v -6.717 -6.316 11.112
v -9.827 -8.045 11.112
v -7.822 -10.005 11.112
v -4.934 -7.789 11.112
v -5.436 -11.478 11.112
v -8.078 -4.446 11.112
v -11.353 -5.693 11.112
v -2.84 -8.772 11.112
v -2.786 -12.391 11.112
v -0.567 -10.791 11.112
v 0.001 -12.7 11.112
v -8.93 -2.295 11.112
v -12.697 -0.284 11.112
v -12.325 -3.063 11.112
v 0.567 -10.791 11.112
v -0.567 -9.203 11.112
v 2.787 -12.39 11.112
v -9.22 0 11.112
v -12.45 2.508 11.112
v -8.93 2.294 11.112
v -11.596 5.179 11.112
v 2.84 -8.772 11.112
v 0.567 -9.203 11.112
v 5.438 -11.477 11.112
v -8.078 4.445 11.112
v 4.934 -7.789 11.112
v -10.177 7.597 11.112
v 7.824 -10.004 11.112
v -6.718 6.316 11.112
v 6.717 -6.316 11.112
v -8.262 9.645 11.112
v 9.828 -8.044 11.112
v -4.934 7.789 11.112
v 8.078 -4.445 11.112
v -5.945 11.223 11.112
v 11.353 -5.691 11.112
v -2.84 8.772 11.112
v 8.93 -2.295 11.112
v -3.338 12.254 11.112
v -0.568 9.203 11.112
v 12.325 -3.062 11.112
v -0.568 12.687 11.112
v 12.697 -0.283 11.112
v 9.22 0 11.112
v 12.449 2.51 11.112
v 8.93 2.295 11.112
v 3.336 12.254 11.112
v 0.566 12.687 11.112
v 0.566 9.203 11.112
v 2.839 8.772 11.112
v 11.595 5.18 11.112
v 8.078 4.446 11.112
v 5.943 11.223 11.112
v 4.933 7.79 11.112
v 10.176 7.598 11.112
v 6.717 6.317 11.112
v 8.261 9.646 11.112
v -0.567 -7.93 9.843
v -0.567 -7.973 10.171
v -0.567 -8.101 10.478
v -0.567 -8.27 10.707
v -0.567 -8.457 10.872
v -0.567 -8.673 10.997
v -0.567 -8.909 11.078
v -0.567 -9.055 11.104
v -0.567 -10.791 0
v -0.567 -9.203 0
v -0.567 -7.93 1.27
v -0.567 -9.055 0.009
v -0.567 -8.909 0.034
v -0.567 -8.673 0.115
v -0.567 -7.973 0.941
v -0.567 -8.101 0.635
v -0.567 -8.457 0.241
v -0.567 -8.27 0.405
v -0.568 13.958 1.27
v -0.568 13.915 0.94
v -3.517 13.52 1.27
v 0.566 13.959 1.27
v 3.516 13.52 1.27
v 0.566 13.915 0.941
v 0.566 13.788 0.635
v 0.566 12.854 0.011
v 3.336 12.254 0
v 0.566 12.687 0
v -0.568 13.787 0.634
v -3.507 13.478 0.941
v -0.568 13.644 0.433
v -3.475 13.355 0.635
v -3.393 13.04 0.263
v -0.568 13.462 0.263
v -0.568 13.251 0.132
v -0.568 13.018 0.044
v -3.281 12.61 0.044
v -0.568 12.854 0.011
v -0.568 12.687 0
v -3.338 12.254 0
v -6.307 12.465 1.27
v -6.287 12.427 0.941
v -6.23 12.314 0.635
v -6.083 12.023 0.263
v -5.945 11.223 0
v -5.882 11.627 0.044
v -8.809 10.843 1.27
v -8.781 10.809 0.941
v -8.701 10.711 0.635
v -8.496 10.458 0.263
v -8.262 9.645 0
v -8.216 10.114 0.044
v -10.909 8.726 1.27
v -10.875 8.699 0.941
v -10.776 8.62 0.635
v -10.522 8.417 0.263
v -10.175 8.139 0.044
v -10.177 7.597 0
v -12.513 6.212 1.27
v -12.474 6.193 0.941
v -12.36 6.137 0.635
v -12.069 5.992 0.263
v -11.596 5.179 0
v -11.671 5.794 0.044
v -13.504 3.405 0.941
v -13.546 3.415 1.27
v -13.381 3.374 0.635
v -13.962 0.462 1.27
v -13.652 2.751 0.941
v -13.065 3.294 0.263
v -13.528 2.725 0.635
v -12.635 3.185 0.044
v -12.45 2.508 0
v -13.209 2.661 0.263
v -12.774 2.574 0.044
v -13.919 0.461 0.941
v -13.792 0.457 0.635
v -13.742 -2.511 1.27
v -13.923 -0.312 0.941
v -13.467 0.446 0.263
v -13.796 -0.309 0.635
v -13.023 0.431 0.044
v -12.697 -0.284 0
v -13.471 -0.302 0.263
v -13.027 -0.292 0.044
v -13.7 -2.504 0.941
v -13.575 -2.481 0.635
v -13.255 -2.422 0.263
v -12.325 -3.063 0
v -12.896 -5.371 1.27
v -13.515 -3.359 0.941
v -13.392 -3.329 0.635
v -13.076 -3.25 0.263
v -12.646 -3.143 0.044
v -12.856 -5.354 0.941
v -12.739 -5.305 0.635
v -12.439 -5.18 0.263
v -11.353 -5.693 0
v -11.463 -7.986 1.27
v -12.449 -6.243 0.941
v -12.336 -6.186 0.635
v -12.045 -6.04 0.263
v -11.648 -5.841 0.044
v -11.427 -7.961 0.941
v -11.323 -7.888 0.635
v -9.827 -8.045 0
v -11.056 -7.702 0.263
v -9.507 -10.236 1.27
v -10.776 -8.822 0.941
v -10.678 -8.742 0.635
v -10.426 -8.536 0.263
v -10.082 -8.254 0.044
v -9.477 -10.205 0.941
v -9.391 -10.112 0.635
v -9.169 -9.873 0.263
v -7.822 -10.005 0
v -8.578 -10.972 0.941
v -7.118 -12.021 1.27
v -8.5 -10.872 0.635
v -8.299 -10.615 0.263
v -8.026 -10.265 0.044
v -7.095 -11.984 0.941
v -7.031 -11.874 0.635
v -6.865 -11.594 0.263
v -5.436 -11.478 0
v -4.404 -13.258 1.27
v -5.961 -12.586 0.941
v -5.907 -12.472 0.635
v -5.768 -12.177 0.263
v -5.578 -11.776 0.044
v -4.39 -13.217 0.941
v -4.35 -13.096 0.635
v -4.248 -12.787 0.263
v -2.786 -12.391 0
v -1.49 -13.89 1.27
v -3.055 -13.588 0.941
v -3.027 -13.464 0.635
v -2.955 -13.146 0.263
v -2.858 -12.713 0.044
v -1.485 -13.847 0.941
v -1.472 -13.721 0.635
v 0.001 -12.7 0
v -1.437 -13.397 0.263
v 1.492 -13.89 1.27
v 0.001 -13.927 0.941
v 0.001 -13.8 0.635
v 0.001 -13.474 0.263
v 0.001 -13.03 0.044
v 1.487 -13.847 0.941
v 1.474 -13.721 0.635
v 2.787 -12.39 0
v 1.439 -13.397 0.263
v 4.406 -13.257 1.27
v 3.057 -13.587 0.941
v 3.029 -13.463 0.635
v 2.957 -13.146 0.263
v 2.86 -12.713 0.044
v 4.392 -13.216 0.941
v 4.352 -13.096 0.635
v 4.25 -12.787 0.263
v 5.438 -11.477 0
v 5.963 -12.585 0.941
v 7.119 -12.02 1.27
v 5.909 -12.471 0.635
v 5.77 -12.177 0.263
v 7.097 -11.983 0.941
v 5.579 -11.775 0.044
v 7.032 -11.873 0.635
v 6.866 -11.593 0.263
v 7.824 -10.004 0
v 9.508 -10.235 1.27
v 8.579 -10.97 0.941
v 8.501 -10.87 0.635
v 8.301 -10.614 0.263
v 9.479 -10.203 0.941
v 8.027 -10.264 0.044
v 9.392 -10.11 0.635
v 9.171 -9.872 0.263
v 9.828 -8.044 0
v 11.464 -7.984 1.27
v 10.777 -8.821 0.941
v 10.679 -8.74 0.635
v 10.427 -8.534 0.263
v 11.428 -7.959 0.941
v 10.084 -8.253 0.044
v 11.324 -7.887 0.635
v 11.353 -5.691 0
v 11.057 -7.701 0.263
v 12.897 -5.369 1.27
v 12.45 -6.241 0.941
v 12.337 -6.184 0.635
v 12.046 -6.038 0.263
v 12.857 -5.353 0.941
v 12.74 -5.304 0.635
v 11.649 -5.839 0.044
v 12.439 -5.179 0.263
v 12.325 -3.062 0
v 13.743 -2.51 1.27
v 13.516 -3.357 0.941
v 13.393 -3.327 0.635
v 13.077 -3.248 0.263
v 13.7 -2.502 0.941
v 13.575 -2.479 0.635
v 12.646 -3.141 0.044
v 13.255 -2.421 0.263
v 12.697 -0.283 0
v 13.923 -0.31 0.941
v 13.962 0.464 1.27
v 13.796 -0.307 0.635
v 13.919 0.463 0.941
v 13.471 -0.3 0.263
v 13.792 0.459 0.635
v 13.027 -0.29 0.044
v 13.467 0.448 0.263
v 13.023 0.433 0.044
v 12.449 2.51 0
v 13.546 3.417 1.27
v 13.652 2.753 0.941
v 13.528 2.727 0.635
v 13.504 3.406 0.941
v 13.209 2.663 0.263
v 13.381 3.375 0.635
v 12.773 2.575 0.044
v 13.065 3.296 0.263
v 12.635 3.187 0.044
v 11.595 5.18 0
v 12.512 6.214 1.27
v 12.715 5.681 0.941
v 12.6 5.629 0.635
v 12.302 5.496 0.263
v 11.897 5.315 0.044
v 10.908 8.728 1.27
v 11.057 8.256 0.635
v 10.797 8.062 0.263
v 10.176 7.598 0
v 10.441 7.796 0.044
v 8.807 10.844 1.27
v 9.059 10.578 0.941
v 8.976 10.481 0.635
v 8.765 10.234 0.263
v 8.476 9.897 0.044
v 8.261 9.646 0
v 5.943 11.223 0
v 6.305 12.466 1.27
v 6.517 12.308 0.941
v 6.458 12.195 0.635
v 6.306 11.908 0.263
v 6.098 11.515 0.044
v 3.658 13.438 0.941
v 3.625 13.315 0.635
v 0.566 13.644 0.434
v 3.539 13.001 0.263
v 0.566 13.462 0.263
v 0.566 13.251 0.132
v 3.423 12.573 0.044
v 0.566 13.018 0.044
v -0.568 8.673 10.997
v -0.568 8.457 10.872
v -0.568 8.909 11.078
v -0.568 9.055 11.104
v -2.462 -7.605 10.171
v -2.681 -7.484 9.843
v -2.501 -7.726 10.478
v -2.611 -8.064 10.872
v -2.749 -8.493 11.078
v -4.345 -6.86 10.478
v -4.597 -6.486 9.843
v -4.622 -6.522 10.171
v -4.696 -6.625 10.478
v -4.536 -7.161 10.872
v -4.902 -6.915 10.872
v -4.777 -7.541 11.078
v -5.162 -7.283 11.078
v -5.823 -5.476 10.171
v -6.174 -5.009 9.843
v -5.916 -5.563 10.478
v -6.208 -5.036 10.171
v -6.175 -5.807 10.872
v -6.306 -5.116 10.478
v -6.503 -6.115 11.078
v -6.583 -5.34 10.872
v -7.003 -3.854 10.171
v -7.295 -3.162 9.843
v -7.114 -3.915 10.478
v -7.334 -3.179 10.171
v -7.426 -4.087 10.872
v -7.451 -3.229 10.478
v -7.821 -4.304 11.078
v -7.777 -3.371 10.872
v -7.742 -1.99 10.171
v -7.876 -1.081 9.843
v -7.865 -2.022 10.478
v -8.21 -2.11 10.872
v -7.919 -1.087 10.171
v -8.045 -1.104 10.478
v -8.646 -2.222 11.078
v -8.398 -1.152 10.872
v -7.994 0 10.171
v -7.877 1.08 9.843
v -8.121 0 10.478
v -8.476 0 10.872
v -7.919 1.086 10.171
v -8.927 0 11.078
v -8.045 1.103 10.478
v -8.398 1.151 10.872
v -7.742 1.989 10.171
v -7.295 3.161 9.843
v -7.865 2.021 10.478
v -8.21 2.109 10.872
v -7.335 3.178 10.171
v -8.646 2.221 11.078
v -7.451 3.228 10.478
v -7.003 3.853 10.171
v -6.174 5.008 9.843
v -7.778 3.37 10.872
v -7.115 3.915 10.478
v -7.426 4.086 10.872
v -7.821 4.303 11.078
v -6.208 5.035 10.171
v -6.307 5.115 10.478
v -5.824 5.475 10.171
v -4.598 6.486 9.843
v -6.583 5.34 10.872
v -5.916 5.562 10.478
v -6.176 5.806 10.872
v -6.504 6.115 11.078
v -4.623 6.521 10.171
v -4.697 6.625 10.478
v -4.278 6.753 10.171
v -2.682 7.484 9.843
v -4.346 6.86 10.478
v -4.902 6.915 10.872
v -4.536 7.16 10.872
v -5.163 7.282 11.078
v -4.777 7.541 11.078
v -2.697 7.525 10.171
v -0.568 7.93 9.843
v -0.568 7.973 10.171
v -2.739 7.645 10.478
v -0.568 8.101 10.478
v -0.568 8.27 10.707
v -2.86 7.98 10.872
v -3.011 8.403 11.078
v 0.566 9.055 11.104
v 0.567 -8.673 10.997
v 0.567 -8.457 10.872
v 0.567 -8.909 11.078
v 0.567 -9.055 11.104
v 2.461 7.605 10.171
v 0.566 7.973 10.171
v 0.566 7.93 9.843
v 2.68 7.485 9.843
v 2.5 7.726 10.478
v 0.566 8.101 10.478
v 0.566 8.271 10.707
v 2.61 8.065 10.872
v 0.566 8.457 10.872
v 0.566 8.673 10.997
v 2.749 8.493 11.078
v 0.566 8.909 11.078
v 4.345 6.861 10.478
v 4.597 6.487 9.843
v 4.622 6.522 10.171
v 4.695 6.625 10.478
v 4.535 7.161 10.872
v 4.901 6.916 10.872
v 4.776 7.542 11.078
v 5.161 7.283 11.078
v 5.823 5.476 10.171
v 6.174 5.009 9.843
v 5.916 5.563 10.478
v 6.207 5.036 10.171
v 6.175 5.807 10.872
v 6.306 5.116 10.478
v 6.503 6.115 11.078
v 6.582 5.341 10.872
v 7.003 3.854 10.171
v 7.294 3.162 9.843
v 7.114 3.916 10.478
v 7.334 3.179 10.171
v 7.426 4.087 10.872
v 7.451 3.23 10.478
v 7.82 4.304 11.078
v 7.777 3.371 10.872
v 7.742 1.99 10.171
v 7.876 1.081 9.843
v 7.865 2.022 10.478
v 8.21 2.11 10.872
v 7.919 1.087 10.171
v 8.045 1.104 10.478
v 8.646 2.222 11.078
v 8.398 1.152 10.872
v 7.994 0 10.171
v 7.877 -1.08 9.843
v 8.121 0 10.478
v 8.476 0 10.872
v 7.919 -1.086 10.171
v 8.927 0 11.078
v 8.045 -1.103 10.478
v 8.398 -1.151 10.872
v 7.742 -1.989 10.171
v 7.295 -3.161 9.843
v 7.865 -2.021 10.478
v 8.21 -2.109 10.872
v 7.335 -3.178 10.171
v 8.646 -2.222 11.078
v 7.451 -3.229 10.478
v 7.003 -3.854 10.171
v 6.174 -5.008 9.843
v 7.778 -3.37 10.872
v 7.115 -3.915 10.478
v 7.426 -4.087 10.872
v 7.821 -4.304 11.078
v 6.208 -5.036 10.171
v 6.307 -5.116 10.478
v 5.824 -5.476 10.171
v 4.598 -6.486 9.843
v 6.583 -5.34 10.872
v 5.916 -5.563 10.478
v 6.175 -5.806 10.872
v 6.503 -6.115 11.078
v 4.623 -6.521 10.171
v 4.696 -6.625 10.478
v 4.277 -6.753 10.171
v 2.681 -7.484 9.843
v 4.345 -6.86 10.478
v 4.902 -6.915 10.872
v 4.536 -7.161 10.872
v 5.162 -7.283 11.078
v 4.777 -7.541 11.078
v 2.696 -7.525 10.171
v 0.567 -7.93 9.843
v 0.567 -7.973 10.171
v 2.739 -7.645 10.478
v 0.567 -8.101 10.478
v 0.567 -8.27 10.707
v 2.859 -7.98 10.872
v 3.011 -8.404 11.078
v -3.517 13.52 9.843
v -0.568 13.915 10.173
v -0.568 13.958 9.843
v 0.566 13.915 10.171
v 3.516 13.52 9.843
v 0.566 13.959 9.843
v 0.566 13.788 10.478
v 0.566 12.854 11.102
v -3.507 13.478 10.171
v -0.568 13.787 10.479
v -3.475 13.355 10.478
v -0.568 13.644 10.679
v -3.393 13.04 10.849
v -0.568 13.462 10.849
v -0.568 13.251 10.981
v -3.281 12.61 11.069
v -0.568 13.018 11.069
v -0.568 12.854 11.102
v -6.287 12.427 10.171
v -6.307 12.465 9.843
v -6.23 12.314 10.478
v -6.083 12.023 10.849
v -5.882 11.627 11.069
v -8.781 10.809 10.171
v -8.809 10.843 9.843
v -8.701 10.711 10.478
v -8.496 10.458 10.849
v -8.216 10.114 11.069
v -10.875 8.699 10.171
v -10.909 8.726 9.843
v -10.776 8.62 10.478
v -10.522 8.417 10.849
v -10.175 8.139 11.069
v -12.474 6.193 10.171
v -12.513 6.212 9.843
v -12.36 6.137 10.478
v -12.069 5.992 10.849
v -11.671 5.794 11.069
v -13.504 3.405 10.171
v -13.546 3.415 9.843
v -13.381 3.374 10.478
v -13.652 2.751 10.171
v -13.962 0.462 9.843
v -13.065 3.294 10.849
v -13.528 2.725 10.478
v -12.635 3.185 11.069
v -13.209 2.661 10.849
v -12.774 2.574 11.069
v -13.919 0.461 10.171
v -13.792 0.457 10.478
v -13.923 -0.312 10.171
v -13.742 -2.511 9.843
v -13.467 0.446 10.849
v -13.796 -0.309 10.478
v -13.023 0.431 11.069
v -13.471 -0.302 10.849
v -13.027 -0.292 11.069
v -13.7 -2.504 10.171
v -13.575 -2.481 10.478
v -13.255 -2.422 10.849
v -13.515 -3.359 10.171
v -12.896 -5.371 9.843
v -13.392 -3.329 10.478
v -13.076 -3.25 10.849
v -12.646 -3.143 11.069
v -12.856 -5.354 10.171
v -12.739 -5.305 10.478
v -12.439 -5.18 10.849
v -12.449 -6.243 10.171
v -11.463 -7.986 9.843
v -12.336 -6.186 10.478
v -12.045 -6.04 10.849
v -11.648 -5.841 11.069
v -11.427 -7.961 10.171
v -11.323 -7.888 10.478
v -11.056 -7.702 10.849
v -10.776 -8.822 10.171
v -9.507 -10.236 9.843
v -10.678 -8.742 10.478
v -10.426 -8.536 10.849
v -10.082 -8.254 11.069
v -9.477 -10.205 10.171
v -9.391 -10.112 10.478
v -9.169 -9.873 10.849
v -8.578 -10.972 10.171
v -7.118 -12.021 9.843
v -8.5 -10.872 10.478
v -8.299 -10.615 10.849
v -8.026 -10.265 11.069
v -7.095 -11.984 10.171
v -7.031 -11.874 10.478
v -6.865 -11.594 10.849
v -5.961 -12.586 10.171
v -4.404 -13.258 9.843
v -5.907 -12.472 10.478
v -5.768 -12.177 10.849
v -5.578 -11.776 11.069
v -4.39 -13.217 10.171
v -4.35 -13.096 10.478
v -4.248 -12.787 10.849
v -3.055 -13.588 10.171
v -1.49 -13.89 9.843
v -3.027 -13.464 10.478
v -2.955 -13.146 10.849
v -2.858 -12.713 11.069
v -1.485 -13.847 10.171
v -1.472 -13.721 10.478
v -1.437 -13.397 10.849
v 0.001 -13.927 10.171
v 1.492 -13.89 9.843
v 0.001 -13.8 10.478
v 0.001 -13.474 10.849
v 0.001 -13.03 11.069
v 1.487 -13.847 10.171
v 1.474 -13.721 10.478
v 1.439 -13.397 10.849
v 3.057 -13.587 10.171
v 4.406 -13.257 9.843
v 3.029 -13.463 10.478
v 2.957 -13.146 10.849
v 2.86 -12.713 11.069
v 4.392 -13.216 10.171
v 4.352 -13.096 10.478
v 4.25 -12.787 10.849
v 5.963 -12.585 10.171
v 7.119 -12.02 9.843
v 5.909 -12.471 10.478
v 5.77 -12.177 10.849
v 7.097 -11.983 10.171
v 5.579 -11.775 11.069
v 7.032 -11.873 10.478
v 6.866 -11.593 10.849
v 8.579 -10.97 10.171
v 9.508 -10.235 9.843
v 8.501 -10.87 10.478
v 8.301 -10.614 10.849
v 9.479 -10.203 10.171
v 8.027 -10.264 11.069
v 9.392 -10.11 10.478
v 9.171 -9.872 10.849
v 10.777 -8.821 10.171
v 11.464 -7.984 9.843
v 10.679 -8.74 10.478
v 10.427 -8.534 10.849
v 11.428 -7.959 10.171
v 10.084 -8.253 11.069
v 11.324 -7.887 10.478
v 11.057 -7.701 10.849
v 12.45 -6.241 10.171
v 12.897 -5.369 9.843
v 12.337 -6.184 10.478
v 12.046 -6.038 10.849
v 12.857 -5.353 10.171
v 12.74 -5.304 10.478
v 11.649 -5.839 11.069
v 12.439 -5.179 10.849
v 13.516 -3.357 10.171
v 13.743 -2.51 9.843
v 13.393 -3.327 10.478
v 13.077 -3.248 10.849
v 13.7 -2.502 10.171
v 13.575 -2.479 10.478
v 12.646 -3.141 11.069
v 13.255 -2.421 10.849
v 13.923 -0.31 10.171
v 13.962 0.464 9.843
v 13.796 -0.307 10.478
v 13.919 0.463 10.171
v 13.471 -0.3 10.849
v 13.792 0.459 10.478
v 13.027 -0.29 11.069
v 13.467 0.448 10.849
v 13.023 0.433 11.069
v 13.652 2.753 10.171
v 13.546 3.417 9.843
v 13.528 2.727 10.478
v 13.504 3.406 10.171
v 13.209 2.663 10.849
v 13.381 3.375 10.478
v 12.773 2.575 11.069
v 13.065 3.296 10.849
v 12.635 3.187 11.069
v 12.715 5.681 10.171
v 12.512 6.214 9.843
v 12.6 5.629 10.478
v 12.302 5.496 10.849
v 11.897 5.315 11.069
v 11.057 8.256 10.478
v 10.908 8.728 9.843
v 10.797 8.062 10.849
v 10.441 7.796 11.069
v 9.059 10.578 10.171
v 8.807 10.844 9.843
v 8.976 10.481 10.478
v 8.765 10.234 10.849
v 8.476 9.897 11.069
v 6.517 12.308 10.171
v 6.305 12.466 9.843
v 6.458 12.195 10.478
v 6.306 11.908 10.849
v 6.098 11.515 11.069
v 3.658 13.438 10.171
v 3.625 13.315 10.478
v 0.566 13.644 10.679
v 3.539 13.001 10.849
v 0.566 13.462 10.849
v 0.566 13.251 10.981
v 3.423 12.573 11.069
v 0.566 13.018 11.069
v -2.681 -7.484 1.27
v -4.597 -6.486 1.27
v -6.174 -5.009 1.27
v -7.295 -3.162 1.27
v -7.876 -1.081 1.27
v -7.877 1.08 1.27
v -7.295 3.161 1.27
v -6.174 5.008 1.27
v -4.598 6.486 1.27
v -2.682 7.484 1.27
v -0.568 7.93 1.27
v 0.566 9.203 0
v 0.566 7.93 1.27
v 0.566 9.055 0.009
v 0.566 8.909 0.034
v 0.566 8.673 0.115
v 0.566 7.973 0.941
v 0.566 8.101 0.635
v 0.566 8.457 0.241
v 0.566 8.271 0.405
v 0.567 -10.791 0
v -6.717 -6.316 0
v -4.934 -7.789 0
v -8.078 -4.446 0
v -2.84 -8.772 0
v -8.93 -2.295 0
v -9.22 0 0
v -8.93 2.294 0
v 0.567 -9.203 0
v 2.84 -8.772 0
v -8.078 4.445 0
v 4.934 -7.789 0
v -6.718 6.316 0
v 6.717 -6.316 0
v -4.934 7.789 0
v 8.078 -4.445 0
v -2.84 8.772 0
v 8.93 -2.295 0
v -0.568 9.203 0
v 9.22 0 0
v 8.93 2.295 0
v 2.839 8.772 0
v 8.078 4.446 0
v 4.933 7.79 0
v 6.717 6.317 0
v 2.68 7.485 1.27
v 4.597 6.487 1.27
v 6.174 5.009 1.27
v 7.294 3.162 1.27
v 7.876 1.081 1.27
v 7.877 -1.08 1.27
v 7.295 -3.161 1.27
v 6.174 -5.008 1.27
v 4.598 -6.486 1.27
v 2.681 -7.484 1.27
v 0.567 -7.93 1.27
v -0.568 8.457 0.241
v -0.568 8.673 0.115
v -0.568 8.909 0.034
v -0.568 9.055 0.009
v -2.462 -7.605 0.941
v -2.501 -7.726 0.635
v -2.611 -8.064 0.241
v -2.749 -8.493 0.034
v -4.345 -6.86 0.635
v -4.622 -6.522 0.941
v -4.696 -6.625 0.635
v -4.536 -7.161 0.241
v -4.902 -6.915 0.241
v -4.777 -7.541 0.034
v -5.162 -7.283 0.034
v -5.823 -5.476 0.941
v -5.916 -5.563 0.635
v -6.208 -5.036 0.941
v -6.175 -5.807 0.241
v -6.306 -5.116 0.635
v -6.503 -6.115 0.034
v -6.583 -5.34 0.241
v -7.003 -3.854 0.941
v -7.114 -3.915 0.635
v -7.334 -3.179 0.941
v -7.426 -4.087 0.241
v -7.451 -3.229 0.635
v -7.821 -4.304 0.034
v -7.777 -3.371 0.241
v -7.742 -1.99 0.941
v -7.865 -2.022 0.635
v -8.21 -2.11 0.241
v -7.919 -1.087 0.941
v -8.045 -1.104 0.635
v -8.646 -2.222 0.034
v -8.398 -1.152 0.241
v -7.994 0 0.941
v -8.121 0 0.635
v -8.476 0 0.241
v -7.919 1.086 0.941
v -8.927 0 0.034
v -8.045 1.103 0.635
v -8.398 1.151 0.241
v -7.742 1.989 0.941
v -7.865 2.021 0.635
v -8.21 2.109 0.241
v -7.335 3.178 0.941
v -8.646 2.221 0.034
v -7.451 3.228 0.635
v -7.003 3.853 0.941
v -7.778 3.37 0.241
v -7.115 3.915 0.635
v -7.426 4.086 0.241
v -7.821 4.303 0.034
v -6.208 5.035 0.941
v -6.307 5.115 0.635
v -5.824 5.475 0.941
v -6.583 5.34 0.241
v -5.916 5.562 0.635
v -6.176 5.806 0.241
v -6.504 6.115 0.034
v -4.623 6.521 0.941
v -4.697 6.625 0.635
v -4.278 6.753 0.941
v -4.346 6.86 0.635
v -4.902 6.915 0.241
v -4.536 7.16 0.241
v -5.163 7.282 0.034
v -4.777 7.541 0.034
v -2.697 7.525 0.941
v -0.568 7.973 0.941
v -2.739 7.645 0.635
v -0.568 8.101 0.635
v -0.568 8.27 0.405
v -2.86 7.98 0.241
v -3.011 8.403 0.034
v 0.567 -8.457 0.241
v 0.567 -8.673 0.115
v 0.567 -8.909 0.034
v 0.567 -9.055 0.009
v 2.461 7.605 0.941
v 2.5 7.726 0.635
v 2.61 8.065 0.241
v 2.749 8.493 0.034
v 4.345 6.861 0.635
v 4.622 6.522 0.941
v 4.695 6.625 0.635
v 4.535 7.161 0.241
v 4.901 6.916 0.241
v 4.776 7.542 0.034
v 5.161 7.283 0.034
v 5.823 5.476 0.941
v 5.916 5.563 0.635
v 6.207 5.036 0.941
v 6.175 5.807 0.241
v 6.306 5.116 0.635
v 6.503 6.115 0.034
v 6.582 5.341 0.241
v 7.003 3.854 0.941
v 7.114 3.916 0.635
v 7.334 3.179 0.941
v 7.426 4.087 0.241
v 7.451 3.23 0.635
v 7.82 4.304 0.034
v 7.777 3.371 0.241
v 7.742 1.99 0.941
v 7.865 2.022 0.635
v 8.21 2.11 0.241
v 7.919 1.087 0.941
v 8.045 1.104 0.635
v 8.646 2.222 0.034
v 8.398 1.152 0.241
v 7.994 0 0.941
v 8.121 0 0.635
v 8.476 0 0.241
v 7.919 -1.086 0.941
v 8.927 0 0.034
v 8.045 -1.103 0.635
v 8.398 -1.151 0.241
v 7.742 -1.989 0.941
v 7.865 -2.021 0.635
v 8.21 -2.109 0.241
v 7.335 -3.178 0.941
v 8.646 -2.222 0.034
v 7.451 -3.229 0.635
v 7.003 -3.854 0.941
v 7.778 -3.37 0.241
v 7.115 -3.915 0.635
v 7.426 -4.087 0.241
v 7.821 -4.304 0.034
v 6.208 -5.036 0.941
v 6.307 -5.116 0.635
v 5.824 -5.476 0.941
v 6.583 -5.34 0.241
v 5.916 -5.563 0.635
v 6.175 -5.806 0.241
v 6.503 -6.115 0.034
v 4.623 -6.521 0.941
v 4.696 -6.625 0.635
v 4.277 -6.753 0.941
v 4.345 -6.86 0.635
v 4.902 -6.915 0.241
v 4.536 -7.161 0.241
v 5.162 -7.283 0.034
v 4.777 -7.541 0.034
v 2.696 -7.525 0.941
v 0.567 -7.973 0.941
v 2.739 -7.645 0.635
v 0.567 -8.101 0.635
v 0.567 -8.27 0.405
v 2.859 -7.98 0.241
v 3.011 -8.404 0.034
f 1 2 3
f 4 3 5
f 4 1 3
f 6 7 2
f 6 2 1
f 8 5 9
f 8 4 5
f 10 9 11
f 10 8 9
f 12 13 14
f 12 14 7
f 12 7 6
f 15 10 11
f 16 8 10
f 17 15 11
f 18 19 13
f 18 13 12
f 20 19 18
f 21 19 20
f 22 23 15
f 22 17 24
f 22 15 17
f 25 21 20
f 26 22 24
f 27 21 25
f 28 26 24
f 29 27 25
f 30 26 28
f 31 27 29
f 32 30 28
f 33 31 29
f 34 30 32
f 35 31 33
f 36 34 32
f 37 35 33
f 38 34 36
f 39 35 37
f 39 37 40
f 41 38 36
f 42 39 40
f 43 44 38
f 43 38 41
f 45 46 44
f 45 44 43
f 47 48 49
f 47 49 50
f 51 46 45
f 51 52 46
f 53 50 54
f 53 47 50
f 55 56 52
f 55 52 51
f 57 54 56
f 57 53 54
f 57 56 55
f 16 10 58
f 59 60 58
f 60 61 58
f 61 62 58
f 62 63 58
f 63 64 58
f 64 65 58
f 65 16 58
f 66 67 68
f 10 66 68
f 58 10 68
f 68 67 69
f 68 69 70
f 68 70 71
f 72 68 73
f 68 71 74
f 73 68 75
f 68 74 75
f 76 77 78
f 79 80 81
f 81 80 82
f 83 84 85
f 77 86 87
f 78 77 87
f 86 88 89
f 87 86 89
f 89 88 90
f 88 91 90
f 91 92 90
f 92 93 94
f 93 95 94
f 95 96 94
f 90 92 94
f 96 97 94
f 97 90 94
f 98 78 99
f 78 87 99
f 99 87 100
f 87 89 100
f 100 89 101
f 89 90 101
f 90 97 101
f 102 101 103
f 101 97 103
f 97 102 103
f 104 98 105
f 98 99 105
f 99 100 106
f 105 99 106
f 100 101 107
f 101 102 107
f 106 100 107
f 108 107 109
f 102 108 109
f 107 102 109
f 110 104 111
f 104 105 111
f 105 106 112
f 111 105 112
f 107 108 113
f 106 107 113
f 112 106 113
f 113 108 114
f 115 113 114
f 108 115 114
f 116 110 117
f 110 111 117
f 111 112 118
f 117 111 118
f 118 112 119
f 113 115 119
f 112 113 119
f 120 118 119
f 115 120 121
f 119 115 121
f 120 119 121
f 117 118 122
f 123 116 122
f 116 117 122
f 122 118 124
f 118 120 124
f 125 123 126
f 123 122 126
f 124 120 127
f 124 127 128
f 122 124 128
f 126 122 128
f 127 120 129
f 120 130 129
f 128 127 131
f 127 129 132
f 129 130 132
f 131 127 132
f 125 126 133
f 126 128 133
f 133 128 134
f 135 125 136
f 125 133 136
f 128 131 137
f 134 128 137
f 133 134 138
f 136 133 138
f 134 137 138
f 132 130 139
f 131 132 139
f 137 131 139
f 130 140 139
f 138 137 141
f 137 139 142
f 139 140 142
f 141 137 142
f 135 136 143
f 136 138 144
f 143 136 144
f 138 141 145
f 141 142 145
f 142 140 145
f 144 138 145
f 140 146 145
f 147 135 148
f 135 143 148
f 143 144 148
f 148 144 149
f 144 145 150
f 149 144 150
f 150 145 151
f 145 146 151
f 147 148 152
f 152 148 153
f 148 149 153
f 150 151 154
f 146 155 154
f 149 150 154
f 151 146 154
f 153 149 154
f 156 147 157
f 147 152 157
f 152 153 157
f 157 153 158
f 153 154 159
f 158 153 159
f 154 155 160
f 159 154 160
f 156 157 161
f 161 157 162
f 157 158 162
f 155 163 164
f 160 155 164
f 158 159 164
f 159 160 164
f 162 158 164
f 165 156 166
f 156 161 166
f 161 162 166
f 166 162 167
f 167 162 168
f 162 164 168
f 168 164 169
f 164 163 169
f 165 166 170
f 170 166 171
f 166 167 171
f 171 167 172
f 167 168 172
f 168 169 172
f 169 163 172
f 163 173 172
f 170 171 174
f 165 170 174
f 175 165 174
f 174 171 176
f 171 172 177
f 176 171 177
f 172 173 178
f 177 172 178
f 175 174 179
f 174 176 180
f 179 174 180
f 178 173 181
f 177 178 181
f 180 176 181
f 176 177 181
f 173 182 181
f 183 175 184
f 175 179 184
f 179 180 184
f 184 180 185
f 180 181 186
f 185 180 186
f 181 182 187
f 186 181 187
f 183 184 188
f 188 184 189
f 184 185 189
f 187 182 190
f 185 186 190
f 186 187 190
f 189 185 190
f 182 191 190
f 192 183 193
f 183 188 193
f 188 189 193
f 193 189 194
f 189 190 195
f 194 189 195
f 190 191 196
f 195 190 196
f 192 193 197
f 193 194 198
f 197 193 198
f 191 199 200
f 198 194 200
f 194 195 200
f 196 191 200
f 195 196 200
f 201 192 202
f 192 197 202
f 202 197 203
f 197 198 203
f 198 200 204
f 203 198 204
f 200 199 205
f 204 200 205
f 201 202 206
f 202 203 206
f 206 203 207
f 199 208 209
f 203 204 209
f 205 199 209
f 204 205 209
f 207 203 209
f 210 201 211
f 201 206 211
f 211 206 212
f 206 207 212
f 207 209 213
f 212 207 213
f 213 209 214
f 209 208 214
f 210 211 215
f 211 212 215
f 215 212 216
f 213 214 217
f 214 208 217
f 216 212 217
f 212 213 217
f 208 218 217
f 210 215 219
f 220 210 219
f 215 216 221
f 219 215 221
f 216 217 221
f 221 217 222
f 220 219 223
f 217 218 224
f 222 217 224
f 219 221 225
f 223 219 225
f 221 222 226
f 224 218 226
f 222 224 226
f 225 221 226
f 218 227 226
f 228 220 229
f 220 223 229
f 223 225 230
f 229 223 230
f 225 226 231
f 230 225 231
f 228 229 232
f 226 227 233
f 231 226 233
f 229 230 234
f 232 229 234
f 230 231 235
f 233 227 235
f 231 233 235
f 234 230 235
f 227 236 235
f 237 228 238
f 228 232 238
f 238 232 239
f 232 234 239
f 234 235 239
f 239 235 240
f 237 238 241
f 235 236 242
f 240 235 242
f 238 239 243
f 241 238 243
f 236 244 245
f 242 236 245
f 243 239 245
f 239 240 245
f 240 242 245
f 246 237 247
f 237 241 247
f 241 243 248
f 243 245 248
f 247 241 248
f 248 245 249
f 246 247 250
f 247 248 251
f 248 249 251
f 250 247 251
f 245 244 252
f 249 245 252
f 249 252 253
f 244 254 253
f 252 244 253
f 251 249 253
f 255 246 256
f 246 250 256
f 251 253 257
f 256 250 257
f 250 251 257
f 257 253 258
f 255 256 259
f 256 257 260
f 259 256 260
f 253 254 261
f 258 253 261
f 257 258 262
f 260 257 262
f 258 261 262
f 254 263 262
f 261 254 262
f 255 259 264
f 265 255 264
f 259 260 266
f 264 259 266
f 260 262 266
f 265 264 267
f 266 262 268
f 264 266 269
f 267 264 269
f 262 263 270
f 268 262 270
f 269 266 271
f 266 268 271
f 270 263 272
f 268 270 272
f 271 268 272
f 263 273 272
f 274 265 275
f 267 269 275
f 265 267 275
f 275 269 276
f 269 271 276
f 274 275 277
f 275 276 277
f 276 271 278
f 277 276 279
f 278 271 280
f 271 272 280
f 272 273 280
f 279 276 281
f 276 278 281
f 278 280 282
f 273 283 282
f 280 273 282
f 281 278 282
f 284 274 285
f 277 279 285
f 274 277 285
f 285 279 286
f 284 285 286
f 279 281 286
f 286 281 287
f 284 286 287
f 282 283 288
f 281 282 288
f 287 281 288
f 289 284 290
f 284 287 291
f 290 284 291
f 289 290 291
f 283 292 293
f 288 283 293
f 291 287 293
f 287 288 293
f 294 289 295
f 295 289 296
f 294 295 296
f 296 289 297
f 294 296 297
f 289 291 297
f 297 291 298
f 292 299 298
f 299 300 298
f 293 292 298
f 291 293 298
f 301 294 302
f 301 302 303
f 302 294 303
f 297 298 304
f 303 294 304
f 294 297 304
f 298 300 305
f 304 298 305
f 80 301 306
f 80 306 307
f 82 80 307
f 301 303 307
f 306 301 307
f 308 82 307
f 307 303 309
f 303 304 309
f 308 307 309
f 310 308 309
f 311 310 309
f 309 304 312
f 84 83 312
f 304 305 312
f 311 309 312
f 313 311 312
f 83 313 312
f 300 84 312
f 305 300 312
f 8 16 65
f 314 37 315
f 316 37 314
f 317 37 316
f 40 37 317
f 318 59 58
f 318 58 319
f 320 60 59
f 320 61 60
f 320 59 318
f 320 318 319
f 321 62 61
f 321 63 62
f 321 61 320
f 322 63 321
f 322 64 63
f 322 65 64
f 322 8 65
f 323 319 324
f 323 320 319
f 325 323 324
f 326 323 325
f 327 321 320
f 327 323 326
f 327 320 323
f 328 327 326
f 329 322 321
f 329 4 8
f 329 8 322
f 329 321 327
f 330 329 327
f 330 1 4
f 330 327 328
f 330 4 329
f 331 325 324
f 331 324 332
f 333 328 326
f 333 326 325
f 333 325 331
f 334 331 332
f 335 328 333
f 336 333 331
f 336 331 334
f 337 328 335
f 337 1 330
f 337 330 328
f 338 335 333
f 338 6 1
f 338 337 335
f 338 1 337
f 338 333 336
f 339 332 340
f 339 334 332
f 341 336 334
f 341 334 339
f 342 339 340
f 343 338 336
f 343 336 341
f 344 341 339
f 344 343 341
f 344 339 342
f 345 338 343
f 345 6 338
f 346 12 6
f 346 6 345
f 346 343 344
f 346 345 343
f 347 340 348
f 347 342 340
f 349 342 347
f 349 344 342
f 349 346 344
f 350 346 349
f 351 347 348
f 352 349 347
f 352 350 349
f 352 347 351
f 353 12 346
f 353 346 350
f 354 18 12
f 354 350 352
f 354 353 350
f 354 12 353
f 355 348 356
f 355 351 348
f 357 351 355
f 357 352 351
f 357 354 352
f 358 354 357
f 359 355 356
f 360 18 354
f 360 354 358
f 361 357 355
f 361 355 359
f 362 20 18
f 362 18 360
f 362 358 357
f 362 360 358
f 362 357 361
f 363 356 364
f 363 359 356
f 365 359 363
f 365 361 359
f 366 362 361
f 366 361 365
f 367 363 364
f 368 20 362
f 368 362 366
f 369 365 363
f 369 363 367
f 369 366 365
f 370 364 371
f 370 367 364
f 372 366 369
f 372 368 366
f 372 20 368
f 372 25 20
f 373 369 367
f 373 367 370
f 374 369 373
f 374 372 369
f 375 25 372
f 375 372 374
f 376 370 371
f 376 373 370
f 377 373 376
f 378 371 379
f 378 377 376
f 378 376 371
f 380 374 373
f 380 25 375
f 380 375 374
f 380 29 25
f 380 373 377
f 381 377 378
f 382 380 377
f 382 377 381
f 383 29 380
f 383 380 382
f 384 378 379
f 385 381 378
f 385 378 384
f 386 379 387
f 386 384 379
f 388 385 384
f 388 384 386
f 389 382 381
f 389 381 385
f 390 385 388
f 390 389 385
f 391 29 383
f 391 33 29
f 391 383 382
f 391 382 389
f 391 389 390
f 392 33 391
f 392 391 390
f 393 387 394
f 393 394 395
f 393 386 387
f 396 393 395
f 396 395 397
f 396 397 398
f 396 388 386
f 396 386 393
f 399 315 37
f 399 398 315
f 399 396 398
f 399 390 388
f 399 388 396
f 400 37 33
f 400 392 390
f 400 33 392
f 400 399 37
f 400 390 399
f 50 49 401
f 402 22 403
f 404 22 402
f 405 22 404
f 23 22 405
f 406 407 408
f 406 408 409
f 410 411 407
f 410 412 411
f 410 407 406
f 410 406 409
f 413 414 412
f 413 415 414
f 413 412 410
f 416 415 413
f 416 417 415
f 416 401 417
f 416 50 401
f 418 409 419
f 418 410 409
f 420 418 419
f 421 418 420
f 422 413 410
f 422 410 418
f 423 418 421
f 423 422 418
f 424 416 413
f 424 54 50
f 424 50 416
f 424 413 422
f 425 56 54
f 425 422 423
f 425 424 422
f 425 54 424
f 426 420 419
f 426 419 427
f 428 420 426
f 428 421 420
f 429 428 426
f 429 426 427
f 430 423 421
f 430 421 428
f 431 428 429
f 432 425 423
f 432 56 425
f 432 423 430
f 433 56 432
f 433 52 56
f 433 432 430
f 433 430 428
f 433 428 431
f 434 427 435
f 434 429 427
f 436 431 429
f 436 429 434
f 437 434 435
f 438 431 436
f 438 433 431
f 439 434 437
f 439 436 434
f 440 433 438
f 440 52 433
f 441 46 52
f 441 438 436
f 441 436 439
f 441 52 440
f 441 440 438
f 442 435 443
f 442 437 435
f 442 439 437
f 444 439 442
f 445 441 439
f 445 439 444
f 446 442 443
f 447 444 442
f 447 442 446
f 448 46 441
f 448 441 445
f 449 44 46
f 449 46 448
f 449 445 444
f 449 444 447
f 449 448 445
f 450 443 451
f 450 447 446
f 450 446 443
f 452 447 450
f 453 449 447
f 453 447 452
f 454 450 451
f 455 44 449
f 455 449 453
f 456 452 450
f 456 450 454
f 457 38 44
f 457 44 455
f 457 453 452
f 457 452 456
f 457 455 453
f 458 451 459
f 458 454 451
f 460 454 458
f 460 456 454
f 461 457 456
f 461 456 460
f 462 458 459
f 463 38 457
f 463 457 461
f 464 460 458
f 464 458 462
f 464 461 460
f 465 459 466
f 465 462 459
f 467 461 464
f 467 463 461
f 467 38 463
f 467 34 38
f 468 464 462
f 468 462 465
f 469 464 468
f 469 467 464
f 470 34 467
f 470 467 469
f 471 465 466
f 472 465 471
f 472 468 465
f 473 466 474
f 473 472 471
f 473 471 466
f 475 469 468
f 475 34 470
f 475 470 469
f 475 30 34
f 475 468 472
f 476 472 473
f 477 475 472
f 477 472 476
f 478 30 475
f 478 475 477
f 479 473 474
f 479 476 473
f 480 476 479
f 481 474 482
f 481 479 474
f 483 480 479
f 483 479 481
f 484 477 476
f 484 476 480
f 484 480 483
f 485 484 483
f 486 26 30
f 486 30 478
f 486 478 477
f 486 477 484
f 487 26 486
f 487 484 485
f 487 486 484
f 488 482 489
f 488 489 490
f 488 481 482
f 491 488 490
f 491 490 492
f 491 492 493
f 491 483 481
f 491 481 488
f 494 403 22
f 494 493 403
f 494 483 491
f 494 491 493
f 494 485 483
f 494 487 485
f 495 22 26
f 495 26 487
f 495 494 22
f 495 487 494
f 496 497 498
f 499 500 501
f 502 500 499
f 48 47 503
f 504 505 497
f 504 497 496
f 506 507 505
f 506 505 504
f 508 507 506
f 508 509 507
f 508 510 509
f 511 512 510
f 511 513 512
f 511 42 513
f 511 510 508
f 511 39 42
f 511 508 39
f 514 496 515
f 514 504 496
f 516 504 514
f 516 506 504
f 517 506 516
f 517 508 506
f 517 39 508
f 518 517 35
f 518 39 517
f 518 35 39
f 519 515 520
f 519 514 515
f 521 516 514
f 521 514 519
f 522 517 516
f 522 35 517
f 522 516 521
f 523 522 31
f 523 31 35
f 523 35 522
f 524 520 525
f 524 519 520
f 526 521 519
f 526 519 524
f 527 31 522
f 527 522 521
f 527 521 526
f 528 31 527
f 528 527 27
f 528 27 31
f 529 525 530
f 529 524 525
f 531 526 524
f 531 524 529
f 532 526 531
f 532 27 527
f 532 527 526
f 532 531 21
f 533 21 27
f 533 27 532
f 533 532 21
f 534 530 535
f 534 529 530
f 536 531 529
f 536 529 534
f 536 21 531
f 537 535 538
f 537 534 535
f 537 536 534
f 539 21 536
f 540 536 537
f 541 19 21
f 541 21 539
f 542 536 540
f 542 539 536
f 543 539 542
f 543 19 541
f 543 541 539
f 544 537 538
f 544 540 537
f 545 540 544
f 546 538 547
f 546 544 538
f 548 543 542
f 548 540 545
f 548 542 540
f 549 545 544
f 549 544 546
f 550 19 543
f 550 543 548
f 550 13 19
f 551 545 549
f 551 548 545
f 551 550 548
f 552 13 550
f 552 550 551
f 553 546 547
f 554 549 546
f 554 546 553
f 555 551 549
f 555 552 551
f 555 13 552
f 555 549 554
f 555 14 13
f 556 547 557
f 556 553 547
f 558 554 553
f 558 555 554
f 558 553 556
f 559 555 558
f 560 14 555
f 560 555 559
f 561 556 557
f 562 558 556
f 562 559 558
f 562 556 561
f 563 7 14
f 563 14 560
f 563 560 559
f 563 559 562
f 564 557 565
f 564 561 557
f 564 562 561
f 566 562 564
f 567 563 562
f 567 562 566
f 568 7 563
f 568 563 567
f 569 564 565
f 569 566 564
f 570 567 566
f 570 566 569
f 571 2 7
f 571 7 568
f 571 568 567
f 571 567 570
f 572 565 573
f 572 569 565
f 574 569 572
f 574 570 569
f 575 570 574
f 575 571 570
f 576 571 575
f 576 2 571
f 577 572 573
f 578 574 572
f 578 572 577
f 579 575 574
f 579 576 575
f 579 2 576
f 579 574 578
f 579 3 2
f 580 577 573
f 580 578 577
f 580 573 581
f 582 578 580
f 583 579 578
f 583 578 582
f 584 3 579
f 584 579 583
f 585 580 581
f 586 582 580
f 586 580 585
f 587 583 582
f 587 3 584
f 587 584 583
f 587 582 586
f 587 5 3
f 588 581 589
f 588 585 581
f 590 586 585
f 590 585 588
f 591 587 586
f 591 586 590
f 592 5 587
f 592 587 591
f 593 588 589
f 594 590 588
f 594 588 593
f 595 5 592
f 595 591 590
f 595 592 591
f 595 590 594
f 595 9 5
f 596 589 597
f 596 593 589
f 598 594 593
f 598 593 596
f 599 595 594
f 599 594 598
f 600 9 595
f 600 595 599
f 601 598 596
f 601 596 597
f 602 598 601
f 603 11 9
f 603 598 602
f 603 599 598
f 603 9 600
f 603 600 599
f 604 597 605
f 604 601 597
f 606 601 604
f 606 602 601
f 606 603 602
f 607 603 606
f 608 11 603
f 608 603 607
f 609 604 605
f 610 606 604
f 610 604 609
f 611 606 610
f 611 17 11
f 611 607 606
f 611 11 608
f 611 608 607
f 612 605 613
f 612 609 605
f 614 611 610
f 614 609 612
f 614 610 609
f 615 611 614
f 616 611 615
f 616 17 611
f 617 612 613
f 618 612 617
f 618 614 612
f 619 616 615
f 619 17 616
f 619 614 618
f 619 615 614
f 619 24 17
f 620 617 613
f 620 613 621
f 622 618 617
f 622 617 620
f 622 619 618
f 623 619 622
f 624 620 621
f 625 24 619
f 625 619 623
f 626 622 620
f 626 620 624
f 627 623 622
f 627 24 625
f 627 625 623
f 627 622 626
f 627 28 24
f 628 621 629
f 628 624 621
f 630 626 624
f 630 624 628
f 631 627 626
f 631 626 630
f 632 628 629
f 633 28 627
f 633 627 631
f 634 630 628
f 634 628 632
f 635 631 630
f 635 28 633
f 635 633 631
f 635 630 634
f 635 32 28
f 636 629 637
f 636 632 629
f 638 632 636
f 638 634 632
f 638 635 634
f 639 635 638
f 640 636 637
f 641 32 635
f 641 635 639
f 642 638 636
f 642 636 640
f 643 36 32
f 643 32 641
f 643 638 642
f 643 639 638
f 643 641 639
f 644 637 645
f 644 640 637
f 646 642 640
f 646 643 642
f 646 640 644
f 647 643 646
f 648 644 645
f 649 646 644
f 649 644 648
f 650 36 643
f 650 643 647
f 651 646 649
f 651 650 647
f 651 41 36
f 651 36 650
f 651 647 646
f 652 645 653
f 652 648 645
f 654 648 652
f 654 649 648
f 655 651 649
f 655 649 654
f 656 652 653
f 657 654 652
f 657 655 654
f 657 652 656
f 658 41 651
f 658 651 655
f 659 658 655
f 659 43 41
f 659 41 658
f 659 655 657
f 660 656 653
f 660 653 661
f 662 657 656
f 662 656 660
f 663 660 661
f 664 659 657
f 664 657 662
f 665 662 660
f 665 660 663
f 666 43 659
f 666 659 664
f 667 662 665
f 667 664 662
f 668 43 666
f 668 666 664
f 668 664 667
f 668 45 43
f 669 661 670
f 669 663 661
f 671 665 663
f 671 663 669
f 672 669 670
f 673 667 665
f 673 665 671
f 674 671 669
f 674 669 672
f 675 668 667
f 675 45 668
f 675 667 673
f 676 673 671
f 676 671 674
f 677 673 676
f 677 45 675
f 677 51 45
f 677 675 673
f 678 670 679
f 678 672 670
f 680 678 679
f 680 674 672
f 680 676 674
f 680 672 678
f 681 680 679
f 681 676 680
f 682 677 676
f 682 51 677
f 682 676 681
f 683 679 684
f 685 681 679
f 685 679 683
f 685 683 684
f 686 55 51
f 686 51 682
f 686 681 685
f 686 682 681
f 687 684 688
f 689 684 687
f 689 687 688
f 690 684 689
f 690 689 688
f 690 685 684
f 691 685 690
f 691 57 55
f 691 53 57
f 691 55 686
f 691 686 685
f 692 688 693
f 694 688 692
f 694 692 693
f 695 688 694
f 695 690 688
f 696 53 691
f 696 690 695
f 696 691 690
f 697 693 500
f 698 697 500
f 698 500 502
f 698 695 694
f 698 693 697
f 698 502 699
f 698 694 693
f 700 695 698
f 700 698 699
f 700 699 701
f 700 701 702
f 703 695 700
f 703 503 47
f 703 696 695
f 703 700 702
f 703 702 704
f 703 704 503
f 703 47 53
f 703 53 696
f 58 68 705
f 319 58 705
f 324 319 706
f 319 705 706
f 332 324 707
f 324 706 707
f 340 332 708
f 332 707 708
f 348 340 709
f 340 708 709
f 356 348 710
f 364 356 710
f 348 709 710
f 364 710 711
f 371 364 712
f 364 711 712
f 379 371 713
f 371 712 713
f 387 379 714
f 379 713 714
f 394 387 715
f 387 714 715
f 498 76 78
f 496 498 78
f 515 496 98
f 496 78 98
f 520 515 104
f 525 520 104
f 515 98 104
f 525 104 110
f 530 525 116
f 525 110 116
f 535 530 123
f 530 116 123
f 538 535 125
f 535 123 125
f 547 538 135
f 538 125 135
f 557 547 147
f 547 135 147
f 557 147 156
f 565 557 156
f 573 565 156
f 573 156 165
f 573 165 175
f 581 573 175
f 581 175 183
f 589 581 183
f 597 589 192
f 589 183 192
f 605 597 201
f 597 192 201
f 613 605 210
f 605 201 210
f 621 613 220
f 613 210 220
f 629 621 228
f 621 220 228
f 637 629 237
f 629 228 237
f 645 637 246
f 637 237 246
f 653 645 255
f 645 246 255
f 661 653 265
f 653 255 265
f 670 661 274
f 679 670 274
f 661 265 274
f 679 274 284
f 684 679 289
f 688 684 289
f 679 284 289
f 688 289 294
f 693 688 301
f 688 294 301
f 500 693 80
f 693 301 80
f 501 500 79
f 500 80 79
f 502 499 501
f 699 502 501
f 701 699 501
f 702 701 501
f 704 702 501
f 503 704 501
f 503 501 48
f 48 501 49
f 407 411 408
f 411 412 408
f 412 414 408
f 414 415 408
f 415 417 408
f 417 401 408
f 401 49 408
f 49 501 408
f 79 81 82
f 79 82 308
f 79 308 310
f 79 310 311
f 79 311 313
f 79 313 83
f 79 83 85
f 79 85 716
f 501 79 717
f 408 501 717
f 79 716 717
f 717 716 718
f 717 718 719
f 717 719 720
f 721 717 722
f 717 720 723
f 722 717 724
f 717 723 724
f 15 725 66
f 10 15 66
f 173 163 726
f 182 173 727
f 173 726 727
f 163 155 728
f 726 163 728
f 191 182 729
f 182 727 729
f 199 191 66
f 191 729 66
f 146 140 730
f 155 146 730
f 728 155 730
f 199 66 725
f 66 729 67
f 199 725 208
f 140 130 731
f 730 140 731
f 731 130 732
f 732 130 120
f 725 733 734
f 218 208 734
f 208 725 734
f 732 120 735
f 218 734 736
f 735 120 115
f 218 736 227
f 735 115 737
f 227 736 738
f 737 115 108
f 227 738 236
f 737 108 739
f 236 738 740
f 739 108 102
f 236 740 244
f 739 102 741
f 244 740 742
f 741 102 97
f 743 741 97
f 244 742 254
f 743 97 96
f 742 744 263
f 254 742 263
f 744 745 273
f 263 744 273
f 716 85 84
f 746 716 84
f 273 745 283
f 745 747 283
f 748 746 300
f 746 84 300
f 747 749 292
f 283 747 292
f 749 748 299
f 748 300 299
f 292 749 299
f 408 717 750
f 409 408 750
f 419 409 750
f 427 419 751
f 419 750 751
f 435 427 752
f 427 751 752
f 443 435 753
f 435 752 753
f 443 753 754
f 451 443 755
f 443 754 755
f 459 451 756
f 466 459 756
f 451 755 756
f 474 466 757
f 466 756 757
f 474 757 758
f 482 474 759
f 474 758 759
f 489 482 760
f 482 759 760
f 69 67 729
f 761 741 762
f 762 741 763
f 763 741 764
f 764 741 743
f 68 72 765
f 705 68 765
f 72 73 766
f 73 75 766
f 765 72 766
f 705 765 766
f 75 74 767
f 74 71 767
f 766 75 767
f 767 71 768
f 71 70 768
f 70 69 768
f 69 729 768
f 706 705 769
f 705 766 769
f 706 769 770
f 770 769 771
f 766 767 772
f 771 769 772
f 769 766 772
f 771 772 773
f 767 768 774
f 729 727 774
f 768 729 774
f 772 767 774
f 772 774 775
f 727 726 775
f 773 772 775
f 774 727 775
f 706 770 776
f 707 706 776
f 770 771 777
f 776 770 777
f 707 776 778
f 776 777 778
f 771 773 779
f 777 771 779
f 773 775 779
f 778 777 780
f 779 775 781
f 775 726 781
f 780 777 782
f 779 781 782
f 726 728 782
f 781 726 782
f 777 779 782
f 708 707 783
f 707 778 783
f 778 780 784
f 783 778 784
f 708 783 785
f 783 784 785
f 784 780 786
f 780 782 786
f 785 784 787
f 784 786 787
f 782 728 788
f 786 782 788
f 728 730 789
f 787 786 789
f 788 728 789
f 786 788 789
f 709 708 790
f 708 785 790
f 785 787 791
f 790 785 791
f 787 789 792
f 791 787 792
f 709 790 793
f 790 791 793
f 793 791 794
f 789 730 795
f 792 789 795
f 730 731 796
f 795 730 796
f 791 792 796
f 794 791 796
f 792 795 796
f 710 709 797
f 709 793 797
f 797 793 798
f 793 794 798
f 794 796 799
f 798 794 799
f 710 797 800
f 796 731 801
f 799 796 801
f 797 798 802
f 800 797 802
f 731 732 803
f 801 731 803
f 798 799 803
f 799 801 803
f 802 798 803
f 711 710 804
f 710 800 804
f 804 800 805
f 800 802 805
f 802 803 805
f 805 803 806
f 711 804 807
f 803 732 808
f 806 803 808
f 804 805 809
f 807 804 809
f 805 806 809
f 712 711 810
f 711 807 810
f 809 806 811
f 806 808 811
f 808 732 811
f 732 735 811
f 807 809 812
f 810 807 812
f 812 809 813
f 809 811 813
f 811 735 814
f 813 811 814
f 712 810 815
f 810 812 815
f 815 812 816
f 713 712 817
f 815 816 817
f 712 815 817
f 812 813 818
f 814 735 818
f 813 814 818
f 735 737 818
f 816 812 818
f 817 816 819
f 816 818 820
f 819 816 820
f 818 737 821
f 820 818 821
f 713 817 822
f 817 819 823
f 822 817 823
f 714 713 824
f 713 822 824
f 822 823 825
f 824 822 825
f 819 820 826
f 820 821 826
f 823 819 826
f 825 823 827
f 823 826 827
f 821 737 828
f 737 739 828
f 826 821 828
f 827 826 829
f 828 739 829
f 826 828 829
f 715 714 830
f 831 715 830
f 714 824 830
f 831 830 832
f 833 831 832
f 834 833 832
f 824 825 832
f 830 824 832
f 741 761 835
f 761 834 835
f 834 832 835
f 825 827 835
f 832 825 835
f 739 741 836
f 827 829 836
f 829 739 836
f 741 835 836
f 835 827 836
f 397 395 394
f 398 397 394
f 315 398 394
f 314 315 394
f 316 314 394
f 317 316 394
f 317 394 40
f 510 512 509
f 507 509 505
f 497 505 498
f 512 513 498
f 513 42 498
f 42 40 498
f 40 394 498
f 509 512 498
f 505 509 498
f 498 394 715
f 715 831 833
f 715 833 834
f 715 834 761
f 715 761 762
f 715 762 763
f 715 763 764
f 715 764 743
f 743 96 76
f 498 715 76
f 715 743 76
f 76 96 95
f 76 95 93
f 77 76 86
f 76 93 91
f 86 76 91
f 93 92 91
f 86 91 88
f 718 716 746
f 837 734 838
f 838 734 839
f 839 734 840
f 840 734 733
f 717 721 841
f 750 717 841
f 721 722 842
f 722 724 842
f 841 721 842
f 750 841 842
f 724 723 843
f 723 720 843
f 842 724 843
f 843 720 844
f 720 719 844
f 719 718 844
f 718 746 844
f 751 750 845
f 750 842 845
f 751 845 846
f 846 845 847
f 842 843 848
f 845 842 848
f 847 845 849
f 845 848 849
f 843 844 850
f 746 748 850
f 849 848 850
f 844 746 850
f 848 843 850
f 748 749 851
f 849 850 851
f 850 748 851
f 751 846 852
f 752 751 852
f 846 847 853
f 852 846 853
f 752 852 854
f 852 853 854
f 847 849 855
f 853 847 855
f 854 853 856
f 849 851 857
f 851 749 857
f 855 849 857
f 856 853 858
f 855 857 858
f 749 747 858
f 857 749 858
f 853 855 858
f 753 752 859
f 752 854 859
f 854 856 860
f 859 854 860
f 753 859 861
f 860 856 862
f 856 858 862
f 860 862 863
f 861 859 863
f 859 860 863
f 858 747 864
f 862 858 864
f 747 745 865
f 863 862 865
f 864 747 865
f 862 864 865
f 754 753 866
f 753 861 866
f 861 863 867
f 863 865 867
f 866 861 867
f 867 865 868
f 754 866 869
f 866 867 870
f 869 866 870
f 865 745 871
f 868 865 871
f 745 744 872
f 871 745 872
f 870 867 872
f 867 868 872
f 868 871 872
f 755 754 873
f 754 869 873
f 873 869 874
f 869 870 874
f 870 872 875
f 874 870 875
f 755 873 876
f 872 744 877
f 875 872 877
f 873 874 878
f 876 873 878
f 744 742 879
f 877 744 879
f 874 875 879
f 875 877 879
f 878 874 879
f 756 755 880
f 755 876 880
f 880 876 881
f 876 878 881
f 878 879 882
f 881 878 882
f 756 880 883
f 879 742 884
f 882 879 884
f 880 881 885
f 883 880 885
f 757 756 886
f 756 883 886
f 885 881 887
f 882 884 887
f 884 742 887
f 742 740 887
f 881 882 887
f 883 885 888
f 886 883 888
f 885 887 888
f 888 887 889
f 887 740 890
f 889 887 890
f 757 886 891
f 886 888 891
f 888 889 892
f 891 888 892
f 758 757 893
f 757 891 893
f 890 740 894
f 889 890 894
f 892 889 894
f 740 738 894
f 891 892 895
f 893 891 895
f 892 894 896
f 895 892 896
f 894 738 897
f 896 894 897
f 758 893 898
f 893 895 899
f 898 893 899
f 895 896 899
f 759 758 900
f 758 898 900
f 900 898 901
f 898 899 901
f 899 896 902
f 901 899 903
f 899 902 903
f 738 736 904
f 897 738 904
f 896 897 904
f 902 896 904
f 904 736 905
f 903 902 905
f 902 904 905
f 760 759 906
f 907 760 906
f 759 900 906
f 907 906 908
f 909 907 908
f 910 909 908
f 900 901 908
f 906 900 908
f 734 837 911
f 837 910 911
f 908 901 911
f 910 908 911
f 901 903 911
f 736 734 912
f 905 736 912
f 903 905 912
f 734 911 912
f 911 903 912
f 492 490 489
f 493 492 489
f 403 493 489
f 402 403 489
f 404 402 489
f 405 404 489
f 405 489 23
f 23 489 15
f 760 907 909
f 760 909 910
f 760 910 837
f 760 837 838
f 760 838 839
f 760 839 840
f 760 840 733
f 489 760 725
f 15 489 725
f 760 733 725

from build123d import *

# Parameters (mm, degrees)
F1_DEPTH = 11.1125
F2_R     = 1.27


# Not quite as in the source:
# - a feature names something its author has since deleted; it is built from what else it names


with BuildPart() as f1:
    # F0 (on Top) → F1 (new body)
    with BuildSketch(Plane.XY):
        with BuildLine():
            Line((0.5669642458, -7.9299578551), (0.5669642458, -10.7905164226))
            Line((0.5669642458, -10.7905164226), (-0.5669642458, -10.7905164226))
            Line((-0.5669642458, -10.7905164226), (-0.5669642458, -7.9299578551))
            ThreePointArc((-0.5669642458, -7.9299578551), (-7.950199987, -0.0004547511), (-0.5678714286, 7.9298929426))
            Line((-0.5678714286, 7.9298929426), (-0.5678714286, 13.9584534258))
            ThreePointArc((-0.5678714286, 13.9584534258), (0.0009078918, -13.9699999705), (0.566057141, 13.9585271183))
            Line((0.566057141, 13.9585271183), (0.566057141, 7.9300226578))
            ThreePointArc((0.566057141, 7.9300226578), (7.950199987, 0.0004547083), (0.5669642458, -7.9299578551))
        make_face()
    extrude(amount=F1_DEPTH)

    # F2
    f2_edges = [f1.edges().sort_by_distance(p)[0] for p in [
        (-7.9502, -0.000455, 11.1125),
        (-7.9502, -0.000455, 0),
        (0.000908, -13.97, 11.1125),
        (0.000908, -13.97, 0),
        (7.9502, 0.000455, 11.1125),
        (7.9502, 0.000455, 0),
    ]]
    fillet(f2_edges, radius=F2_R)


solid = f1.part
